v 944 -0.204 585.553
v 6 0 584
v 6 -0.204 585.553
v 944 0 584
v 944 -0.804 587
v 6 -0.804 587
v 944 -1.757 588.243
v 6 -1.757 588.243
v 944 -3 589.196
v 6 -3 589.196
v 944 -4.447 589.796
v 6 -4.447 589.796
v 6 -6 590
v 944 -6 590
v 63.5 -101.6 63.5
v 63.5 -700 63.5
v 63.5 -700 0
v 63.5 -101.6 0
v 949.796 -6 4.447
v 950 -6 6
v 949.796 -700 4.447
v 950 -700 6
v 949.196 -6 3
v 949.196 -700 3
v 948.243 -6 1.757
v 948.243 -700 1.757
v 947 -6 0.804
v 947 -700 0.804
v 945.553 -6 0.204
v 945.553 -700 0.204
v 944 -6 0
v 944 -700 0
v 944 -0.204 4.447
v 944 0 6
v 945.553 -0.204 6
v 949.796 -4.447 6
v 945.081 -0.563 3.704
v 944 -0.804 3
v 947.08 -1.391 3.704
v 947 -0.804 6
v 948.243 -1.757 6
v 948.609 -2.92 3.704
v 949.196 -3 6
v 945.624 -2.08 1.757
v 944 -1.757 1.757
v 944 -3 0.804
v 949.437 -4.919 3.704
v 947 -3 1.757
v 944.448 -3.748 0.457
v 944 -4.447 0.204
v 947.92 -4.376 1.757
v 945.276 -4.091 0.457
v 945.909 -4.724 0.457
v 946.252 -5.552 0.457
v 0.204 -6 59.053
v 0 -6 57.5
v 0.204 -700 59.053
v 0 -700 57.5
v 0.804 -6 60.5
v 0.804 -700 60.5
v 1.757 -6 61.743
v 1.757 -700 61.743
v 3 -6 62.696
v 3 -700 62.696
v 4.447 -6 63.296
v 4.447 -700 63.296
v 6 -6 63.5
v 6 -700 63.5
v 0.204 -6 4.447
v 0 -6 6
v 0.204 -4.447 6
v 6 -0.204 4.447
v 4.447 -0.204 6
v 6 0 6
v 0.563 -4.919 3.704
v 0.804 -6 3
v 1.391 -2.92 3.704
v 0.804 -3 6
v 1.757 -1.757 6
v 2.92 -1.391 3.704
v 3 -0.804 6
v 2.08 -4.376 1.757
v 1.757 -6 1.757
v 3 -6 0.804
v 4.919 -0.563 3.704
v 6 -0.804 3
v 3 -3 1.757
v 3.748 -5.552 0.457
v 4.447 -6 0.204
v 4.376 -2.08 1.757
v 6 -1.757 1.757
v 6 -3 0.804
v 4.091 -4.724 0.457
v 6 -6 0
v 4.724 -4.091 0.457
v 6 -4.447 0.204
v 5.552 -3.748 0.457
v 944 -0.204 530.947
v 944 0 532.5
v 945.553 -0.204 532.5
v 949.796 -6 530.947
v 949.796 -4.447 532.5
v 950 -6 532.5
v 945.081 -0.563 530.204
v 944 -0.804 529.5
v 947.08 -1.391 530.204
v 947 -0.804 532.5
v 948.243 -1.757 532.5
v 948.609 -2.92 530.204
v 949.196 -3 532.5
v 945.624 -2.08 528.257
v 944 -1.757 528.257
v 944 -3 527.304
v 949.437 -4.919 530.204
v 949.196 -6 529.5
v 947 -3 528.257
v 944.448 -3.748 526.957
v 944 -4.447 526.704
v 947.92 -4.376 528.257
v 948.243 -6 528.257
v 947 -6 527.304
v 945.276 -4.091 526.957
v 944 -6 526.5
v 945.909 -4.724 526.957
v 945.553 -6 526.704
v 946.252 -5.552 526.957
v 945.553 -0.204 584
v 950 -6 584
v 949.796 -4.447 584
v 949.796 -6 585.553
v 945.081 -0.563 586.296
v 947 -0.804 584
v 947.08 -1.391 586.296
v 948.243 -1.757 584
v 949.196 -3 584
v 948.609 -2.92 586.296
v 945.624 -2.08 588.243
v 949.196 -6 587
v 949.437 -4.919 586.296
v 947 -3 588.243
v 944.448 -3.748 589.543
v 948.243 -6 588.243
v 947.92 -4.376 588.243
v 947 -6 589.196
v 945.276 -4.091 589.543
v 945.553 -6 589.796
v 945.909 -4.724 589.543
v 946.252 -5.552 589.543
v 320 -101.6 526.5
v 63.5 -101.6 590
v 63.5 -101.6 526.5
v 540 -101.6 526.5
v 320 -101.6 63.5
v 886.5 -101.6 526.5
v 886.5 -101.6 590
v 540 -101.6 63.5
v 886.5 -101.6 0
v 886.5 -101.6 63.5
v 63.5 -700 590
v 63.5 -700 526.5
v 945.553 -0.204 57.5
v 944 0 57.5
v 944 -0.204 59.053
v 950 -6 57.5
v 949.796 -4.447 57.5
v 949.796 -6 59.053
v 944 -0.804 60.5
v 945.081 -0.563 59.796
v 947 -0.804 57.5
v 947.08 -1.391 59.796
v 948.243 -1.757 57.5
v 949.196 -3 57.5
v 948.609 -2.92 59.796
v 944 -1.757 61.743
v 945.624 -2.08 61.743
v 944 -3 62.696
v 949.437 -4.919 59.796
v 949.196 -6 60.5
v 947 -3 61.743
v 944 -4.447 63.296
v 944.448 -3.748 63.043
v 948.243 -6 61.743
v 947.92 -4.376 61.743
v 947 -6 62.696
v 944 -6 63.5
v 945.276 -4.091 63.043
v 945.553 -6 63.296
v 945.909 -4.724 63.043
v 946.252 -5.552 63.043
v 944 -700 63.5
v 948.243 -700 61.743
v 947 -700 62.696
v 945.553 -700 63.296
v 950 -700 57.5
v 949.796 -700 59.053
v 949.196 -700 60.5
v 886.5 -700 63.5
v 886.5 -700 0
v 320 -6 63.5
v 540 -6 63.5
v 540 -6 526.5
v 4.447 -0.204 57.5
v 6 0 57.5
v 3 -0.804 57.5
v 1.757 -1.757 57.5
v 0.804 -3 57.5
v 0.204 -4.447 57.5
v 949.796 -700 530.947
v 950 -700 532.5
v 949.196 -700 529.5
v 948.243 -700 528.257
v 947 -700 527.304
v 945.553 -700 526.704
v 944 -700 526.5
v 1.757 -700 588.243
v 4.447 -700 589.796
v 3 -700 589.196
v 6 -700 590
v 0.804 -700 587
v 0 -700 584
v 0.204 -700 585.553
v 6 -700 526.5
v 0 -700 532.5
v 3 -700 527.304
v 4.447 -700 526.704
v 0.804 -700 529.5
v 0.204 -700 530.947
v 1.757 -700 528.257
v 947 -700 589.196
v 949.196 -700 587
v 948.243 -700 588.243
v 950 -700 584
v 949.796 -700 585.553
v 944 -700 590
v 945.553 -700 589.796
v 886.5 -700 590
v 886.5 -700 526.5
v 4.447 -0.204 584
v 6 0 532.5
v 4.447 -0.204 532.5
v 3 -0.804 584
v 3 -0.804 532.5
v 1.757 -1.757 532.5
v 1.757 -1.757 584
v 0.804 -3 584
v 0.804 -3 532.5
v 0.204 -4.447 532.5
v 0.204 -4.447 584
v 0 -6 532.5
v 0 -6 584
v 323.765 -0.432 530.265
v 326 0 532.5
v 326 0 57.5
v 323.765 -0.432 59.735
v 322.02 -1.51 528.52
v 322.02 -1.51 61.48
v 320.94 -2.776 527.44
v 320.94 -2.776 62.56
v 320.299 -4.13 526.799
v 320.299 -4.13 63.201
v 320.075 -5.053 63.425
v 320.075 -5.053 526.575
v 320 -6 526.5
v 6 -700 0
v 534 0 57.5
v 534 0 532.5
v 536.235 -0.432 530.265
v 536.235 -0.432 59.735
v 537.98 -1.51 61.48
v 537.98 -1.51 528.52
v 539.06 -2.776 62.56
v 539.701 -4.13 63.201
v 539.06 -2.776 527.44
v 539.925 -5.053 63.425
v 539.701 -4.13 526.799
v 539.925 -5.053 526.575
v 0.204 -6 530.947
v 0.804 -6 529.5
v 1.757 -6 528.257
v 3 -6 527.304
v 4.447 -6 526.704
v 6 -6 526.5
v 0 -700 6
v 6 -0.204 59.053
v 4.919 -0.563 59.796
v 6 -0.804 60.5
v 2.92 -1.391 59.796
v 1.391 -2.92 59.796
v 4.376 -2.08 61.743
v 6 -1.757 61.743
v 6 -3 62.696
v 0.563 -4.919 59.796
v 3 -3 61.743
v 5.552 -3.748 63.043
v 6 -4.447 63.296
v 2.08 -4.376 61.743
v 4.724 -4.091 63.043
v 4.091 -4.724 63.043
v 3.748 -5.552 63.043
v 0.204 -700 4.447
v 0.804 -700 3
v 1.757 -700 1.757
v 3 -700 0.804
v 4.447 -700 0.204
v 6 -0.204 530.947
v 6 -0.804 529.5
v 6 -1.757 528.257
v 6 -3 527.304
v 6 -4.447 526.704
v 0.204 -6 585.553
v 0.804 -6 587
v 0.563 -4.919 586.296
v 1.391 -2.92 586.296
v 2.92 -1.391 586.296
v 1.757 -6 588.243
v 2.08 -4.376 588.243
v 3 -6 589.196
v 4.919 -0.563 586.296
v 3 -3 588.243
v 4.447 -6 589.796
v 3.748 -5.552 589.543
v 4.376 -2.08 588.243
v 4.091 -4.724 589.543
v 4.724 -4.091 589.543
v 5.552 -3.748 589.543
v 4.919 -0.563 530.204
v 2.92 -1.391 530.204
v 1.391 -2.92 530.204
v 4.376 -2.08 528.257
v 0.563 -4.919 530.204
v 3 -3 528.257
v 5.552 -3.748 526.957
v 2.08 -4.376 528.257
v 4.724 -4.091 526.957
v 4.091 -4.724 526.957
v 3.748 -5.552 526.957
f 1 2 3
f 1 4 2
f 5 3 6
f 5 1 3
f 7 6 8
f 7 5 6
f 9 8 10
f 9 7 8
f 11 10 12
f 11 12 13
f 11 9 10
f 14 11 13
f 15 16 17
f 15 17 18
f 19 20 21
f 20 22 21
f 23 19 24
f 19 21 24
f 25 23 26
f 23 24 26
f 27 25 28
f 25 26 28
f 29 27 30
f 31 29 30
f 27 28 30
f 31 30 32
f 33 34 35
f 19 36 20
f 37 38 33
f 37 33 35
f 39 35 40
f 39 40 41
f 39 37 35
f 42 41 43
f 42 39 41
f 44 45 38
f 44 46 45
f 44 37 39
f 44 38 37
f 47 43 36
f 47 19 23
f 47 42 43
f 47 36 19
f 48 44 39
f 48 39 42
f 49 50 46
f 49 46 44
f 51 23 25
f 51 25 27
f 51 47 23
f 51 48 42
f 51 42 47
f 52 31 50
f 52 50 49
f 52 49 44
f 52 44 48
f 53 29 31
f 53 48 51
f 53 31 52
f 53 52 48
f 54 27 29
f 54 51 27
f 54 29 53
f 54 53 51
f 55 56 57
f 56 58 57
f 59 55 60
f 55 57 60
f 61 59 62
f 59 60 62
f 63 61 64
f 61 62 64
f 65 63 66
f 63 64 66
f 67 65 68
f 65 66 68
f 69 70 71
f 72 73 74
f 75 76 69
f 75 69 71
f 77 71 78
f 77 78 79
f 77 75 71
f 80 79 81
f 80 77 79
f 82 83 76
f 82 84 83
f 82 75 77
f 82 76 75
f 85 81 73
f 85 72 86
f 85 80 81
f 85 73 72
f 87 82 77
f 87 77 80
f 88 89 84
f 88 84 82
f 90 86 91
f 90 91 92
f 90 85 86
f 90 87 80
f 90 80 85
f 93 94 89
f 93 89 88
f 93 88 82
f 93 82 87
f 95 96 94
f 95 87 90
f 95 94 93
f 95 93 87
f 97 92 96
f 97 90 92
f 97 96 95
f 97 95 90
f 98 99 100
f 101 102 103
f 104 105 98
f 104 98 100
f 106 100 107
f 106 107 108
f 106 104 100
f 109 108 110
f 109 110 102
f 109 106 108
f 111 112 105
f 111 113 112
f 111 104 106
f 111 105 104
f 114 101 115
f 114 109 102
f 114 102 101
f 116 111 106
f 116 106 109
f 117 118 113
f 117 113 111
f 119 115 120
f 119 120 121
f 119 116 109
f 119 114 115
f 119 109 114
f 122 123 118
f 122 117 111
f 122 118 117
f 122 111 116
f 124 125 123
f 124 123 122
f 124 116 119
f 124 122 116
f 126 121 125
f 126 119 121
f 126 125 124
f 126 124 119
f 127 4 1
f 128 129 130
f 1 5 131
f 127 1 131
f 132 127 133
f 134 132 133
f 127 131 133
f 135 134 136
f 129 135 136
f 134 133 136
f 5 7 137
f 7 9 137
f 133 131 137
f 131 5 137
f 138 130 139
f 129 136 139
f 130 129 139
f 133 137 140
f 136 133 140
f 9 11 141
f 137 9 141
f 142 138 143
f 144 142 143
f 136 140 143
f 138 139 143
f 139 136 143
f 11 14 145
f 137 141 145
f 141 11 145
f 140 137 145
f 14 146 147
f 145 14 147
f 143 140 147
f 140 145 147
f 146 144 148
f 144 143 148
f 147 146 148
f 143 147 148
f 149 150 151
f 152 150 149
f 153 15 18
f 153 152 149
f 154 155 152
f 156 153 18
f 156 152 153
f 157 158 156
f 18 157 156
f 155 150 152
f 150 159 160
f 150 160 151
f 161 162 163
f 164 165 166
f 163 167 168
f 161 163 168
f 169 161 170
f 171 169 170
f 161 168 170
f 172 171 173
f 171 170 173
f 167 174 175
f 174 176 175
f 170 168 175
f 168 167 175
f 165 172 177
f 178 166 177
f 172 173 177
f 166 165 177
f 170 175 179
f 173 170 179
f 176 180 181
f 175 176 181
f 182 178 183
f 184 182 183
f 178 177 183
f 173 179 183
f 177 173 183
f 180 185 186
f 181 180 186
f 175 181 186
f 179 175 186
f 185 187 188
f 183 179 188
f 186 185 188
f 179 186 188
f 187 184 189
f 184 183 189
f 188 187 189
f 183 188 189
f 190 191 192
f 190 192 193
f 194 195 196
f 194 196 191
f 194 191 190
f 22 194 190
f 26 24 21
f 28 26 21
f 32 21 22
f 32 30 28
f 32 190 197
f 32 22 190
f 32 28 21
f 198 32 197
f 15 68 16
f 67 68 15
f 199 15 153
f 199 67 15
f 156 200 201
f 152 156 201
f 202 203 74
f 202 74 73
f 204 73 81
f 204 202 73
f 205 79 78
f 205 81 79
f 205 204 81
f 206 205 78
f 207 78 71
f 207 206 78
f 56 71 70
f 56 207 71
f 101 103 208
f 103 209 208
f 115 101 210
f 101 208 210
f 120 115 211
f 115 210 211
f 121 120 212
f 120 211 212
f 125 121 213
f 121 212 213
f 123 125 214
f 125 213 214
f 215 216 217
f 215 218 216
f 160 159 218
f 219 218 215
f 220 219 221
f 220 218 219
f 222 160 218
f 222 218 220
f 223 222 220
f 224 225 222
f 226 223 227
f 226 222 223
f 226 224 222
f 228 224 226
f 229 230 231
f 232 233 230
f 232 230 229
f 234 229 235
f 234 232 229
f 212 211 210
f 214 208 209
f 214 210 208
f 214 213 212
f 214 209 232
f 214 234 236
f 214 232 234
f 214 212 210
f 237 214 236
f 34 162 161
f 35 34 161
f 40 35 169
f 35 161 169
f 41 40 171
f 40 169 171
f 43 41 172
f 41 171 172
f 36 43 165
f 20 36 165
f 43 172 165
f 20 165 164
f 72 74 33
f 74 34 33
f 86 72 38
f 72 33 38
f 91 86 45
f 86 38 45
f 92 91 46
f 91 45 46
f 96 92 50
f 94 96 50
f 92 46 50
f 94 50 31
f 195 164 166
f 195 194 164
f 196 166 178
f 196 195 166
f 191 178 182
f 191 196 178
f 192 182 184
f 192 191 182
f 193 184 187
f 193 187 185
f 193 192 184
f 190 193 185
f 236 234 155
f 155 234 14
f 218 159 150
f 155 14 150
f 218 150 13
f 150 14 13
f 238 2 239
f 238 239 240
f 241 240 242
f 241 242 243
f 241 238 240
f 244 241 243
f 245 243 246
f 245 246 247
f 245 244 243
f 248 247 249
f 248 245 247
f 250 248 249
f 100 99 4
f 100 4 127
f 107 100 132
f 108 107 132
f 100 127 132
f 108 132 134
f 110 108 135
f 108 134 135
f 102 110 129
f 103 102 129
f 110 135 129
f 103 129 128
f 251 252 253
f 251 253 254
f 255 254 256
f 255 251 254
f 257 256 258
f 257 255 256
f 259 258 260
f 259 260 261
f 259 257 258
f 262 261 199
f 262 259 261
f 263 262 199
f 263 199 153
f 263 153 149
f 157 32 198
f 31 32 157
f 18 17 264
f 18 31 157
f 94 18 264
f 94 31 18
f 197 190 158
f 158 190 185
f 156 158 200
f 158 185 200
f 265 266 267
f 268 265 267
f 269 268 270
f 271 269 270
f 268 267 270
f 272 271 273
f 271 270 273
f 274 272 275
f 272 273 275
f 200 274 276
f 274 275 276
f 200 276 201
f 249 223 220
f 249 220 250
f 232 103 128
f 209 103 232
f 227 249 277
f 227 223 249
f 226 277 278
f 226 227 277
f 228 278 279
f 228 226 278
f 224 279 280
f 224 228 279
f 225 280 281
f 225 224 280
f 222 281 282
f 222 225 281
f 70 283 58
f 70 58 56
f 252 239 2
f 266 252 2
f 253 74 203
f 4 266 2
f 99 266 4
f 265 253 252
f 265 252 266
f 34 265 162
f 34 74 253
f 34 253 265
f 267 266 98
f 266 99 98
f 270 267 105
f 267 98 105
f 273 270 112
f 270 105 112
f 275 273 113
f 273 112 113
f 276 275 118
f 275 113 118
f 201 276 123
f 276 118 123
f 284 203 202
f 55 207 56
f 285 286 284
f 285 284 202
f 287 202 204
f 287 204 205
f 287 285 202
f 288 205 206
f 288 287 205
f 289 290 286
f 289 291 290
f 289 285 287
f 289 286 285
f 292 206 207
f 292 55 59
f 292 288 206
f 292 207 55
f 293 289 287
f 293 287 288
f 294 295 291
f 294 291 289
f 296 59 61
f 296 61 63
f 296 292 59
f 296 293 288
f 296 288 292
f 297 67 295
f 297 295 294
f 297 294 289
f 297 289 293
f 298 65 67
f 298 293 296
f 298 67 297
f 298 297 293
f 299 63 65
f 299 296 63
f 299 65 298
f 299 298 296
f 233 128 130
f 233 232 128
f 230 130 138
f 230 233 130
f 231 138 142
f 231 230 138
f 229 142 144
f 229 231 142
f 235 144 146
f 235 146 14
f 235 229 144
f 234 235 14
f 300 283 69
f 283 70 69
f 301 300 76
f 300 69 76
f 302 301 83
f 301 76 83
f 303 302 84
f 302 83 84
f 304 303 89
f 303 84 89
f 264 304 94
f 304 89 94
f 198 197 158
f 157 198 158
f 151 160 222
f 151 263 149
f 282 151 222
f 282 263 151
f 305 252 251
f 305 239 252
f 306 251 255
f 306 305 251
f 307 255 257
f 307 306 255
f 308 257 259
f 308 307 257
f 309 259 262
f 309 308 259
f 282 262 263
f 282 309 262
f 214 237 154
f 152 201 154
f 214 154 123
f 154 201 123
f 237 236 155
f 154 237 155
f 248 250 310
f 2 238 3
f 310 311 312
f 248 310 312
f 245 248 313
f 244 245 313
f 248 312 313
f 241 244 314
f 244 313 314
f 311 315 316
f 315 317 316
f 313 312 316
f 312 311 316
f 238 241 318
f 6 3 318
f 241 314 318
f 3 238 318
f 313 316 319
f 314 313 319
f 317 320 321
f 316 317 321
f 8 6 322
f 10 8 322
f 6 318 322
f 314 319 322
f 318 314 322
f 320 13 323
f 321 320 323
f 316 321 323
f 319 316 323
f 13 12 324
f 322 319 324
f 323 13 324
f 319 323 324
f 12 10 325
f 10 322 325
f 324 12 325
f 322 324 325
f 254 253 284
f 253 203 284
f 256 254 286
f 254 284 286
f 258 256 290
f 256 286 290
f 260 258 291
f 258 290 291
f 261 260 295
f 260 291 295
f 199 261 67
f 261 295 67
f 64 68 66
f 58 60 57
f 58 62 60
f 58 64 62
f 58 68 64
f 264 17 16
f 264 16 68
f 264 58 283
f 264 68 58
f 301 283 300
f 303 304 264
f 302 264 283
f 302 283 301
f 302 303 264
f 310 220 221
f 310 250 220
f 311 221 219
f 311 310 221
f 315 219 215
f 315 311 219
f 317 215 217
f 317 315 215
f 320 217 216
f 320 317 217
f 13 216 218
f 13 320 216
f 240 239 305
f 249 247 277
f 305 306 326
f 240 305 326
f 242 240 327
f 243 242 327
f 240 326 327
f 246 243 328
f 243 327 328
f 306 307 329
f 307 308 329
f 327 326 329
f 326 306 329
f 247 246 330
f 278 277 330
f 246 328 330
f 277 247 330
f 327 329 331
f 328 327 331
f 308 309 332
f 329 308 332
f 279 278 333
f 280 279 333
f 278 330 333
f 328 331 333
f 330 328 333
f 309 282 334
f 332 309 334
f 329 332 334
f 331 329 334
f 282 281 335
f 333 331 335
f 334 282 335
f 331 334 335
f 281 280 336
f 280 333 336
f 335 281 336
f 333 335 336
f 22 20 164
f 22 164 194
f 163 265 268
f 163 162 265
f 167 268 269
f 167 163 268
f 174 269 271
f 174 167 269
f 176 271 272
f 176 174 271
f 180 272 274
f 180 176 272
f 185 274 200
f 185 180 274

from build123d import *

# Parameters (mm, degrees)
SALIENTE_EXTRUIR1_DEPTH = 590
CROQUIS2_W              = 823.0000000000001
CROQUIS2_H              = 598.4
CORTAR_EXTRUIR1_DEPTH   = 1000
CORTAR_EXTRUIR2_DEPTH   = 1000
CORTAR_EXTRUIR3_DEPTH   = 200
REDONDEO1_R             = 6
REDONDEO2_R             = 6
REDONDEO3_R             = 6


with BuildPart() as part:
    # Croquis1 → Saliente-Extruir1 (new body)
    with BuildSketch(Plane.XY):
        Polygon((0, 0), (950, 0), (950.0000000000001, -700), (8.573e-14, -700), align=None)
    extrude(amount=SALIENTE_EXTRUIR1_DEPTH)

    # Croquis2 → Cortar-Extruir1 (cut)
    with BuildSketch(Plane.XY.offset(590)):
        with Locations((475.00000000000006, -400.8)):
            Rectangle(CROQUIS2_W, CROQUIS2_H)
    extrude(amount=-CORTAR_EXTRUIR1_DEPTH, mode=Mode.SUBTRACT)

    # Croquis3 → Cortar-Extruir2 (cut)
    with BuildSketch(Plane(origin=(950, 1.5067e-13, 0), x_dir=(0, 0, -1), z_dir=(1, 1.6e-16, 0))):
        Polygon((-526.5, -101.60000000000014), (-63.5, -101.60000000000014), (-63.499999999999886, -700.0000000000001), (-526.4999999999999, -700.0000000000001), align=None)
    extrude(amount=-CORTAR_EXTRUIR2_DEPTH, mode=Mode.SUBTRACT)

    # Croquis4 → Cortar-Extruir3 (cut)
    with BuildSketch(Plane(origin=(0, 0, 0), x_dir=(1, 0, 0), z_dir=(0, 1, 0))):
        Polygon((4.857e-14, -63.5), (320.00000000000006, -63.5), (320.0000000000001, -526.5), (5.67e-14, -526.5), align=None)
        Polygon((950, -63.5), (540, -63.50000000000004), (540.0000000000001, -526.4999999999999), (950.0000000000001, -526.4999999999999), align=None)
    extrude(amount=-CORTAR_EXTRUIR3_DEPTH, mode=Mode.SUBTRACT)

    # Redondeo1
    redondeo1_edges = [part.edges().sort_by_distance(p)[0] for p in [
        (0, 0, 31.75),
        (0, 0, 558.25),
        (950, 0, 558.25),
        (950, 0, 31.75),
    ]]
    fillet(redondeo1_edges, radius=REDONDEO1_R)

    # Redondeo2
    redondeo2_edges = [part.edges().sort_by_distance(p)[0] for p in [
        (320.0000000000001, 0, 295),
        (540, 0, 294.99999999999994),
    ]]
    fillet(redondeo2_edges, radius=REDONDEO2_R)

    # Redondeo3
    redondeo3_edges = [part.edges().sort_by_distance(p)[0] for p in [
        (950.0000000000001, -353, 590),
        (948.2426406871193, -1.7573593128807152, 590),
        (4.323e-14, -353, 590),
        (1.7573593128807161, -1.7573593128807143, 590),
        (950.0000000000001, -353, 0),
        (948.2426406871193, -1.7573593128807152, 0),
        (4.323e-14, -353, 0),
        (1.7573593128807161, -1.7573593128807143, 0),
        (950.0000000000001, -353, 526.4999999999999),
        (948.2426406871193, -1.7573593128807152, 526.4999999999999),
        (7.839e-14, -353, 526.4999999999999),
        (1.7573593128807161, -1.7573593128807143, 526.5),
        (7.436e-14, -353, 63.49999999999994),
        (1.7573593128807161, -1.7573593128807143, 63.5),
        (950.0000000000001, -353, 63.49999999999994),
        (948.2426406871193, -1.7573593128807152, 63.5),
        (475, 0, 590),
        (475, 0, 0),
        (739, 0, 526.4999999999999),
        (166.00000000000006, 4.4e-16, 526.5),
        (166.00000000000003, 4.4e-16, 63.5),
        (739, 0, 63.50000000000002),
    ]]
    fillet(redondeo3_edges, radius=REDONDEO3_R)


solid = part.part
